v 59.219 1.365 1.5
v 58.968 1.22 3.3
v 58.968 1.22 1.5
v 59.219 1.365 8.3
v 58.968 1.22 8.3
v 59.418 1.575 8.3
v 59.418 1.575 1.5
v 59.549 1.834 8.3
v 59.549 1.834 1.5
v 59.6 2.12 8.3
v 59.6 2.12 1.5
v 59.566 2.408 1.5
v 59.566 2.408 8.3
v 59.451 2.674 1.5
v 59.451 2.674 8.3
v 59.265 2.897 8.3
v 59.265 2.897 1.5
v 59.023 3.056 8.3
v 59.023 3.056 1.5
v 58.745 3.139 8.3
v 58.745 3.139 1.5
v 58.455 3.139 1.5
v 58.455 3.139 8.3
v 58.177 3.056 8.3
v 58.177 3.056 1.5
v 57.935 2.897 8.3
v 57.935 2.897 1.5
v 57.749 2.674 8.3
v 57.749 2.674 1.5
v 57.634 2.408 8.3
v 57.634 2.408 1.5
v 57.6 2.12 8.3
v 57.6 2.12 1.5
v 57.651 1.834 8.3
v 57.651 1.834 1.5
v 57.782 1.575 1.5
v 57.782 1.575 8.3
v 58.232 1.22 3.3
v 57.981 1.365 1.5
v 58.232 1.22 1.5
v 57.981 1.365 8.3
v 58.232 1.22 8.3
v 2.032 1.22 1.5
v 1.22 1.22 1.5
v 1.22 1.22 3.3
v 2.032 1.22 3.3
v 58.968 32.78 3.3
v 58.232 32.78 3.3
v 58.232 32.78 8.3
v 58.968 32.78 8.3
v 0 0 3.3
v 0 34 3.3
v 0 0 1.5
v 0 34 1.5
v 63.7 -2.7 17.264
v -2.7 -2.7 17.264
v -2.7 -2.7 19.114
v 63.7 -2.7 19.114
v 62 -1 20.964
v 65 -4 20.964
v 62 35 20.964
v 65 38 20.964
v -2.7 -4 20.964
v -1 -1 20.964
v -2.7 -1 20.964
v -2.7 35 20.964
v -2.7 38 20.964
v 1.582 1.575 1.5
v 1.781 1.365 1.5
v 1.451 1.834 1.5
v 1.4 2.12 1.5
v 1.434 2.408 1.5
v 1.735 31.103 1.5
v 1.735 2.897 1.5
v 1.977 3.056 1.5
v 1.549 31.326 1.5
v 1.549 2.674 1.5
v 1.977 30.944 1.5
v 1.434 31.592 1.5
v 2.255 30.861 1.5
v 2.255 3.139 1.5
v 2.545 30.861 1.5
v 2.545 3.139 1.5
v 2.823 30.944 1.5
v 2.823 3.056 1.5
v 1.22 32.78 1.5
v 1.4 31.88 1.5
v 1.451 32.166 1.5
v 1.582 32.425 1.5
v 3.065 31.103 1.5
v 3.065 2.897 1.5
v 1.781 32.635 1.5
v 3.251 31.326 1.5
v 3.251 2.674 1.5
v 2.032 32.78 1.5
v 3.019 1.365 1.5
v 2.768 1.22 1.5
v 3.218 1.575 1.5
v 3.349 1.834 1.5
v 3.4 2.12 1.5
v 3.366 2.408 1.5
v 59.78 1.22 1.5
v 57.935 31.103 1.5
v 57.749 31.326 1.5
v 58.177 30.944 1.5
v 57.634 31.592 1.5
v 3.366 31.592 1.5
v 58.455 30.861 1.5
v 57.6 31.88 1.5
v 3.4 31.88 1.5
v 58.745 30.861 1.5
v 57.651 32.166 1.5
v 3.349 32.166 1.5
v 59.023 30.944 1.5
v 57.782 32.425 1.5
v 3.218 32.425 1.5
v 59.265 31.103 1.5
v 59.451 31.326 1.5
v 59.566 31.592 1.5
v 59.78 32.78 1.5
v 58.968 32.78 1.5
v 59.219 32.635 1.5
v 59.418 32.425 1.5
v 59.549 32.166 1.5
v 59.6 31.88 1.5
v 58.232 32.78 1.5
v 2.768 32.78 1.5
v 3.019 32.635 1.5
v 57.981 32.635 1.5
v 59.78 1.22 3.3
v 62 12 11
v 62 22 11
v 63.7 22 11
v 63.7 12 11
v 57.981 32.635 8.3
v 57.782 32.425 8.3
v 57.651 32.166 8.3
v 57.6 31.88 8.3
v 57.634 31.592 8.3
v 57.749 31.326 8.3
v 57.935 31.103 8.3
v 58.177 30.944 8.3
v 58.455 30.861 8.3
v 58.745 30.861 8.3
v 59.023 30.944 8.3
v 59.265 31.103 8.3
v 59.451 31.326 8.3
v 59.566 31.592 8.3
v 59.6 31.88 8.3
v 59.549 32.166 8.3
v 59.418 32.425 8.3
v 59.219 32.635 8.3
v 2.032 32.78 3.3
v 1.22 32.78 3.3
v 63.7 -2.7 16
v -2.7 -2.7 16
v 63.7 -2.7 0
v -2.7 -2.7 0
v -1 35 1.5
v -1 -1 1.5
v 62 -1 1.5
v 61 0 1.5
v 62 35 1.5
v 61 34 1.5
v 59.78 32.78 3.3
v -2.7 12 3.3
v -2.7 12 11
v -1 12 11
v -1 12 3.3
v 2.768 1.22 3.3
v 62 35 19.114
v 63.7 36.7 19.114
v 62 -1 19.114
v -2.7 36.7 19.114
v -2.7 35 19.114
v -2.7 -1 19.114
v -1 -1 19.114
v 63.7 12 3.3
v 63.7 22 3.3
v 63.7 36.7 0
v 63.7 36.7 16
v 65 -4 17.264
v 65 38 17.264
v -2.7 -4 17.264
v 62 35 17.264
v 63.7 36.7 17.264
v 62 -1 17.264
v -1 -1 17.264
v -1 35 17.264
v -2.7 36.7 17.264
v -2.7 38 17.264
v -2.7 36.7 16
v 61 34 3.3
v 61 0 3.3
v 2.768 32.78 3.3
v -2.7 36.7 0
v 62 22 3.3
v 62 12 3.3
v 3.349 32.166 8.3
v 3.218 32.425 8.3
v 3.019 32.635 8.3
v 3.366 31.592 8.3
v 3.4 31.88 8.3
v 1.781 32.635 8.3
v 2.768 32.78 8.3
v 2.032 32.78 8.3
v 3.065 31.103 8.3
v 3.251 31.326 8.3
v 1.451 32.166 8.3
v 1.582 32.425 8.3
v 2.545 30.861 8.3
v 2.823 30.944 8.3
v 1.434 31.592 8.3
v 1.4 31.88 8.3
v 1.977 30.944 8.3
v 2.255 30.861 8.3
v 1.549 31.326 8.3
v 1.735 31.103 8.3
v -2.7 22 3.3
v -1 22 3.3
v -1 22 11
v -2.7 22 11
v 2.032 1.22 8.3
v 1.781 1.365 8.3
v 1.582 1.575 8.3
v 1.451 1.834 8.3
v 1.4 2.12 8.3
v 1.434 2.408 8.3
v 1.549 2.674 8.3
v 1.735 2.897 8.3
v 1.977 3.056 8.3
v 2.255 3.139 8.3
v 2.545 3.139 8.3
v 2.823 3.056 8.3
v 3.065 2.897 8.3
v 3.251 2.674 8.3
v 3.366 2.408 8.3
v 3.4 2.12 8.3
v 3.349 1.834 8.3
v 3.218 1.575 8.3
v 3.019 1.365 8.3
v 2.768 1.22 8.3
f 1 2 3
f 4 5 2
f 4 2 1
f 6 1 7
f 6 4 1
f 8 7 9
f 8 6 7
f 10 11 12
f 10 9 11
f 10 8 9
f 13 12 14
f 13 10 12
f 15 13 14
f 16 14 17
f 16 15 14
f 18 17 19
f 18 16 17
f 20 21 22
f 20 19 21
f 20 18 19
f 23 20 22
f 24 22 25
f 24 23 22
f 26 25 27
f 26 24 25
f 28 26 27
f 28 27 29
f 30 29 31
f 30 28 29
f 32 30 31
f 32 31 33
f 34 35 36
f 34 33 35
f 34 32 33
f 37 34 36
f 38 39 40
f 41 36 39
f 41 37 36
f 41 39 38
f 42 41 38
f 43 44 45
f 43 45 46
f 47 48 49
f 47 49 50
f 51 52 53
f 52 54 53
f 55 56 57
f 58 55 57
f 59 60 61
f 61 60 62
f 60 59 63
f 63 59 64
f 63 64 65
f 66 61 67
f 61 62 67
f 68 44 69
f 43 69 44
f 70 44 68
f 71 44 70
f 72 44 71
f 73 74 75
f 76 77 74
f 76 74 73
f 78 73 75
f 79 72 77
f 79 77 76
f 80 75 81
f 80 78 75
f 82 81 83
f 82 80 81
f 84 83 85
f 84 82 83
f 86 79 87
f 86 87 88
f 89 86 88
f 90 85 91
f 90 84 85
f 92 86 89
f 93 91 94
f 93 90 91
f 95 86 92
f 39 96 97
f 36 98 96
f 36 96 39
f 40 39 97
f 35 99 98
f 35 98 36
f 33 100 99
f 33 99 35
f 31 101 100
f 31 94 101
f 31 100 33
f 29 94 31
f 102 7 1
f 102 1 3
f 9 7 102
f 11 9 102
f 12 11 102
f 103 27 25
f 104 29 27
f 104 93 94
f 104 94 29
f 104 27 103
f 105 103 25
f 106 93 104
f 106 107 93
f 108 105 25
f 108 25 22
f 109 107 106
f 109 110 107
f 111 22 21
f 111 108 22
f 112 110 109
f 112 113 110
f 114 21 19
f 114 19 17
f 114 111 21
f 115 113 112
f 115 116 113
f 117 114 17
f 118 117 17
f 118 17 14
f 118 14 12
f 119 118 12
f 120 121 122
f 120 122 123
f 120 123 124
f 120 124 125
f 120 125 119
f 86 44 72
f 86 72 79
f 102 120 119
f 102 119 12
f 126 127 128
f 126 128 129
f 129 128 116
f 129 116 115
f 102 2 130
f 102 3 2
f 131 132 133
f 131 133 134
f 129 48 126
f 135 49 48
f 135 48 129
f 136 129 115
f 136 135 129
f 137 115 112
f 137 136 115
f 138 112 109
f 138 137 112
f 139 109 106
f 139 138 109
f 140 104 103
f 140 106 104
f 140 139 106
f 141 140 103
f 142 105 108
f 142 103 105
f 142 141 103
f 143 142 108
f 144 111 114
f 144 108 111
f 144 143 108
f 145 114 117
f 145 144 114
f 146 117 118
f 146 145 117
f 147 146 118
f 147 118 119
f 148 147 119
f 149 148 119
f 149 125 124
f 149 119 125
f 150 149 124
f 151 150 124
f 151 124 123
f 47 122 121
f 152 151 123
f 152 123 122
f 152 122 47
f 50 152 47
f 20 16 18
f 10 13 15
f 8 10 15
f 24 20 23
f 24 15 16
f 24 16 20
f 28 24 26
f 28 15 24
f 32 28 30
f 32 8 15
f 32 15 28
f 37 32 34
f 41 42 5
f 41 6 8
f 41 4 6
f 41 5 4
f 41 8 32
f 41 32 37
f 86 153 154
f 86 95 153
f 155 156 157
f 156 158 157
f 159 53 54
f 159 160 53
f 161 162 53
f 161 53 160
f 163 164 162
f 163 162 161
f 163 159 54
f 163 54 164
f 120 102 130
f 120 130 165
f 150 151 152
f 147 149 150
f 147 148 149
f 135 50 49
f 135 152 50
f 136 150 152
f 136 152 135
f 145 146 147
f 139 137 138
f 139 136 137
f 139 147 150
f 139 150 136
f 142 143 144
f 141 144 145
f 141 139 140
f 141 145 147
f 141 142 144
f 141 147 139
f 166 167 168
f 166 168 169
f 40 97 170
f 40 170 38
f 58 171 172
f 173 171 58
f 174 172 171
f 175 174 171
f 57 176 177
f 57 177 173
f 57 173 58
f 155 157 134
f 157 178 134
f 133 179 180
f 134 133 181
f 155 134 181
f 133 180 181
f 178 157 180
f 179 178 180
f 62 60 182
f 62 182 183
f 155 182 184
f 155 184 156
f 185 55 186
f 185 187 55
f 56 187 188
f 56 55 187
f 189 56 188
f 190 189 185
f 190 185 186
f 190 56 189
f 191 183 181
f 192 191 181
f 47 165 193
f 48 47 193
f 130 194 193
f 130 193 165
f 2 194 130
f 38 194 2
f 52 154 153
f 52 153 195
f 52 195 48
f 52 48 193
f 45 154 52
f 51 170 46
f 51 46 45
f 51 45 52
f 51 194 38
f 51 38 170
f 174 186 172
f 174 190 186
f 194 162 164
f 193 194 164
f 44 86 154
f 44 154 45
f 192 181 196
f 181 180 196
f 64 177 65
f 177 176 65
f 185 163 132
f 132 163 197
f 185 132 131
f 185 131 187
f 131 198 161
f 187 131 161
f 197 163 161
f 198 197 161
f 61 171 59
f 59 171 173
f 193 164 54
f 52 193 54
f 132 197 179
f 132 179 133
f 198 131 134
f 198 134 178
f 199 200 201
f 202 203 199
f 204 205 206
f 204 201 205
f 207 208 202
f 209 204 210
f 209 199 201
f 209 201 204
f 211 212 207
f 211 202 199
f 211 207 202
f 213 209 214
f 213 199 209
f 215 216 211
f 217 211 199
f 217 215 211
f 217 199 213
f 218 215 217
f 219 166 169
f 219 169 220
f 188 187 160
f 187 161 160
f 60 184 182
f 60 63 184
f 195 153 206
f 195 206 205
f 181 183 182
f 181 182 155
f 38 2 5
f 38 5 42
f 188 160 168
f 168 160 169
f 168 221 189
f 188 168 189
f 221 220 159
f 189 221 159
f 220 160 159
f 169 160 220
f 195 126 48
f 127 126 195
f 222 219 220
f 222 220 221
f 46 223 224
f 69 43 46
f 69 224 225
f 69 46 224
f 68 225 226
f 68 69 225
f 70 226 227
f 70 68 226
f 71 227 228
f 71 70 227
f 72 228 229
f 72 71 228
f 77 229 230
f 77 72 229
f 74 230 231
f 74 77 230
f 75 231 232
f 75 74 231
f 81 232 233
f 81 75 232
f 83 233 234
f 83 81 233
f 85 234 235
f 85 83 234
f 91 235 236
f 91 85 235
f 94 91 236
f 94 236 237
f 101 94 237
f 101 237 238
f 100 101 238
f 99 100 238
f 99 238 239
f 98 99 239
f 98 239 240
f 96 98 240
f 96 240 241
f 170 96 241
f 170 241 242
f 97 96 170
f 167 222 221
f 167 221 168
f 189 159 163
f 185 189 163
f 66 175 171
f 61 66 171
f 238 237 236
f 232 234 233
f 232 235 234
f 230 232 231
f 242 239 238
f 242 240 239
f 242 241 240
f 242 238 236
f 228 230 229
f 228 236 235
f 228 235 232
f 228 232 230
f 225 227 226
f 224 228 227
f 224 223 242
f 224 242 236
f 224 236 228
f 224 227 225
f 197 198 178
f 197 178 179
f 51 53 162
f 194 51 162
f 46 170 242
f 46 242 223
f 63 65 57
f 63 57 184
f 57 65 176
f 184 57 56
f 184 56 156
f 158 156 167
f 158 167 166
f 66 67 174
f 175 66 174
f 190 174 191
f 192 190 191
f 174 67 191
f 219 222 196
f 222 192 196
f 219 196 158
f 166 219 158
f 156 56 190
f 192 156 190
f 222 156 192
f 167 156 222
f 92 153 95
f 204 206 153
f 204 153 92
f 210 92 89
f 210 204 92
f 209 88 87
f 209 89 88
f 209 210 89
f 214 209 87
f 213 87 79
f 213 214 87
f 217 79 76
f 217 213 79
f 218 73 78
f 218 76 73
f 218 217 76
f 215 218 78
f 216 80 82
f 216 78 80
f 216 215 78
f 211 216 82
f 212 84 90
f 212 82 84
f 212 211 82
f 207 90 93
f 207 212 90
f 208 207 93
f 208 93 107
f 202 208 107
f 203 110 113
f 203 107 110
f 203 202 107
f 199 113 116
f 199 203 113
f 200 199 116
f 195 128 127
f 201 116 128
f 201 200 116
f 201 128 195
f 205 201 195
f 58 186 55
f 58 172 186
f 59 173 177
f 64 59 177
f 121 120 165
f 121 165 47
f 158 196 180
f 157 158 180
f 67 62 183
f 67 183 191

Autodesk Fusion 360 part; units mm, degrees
sketch "Spodek" plane through (0, 0, 0) normal (0, 0, 1) x (1, 0, 0)
  line L0 (0, 0) -> (61, 0)
  line L1 (61, 0) -> (61, 34)
  line L2 (61, 34) -> (0, 34)
  line L3 (0, 34) -> (0, 0)
  line L4 (-1, 35) -> (62, 35)
  line L5 (62, 35) -> (62, -1)
  line L6 (62, -1) -> (-1, -1)
  line L7 (-1, -1) -> (-1, 35)
  line L8 (-2.7, -2.7) -> (-2.7, 36.7) construction
  line L9 (63.7, 36.7) -> (-2.7, 36.7) construction
  line L10 (63.7, -2.7) -> (63.7, 36.7) construction
  line L11 (63.7, -2.7) -> (-2.7, -2.7) construction
  line L12 (-2.7, -2.7) -> (63.7, -2.7)
  line L13 (63.7, -2.7) -> (63.7, 36.7)
  line L14 (63.7, 36.7) -> (-2.7, 36.7)
  line L15 (-2.7, 36.7) -> (-2.7, -2.7)
  dimension "d1" = 61
  dimension "d2" = 34
  dimension "d3" = 63
  dimension "d4" = 36
  dimension "d5" = 1.7
  dimension "d6" = 1.7
  dimension "d7" = 1.7
  dimension "d8" = 1.7
sketch "TotoNevim" plane through (0, 0, 0) normal (0, 0, 1) x (1, 0, 0)
extrude "Extrude1" add sketch "Spodek" along normal blind 12 contours L12 L13 L14 L15 makes body 1
extrude "Extrude2" add sketch "Spodek" along normal blind 1.5 contours L0 L1 L2 L3 | L4 L5 L6 L7 bodies 1
sketch "Sketch3" plane through (0, 0, 1.5) normal (0, 0, 1) x (-1, 0, 0)
  line L0 (1, 1) -> (-62, 1)
  line L1 (-62, 1) -> (-62, -35)
  line L2 (-62, -35) -> (1, -35)
  line L3 (1, -35) -> (1, 1)
  line L4 (-59.78, -32.78) -> (-1.22, -32.78)
  line L5 (-1.22, -32.78) -> (-1.22, -1.22)
  line L6 (-1.22, -1.22) -> (-59.78, -1.22)
  line L7 (-59.78, -1.22) -> (-59.78, -32.78)
  line L8 (-61, 0) -> (-61, -34)
  line L9 (0, 0) -> (-61, 0)
  line L10 (0, -34) -> (0, 0)
  line L11 (-61, -34) -> (0, -34)
  dimension "d13" = 1.22
  dimension "d14" = 1.22
  dimension "d15" = 1.22
  dimension "d16" = 1.22
extrude "Extrude3" add sketch "Sketch3" along normal blind 1.8 contours L8 L9 L10 L11 bodies 1
extrude "Extrude4" add 1 faces at (20, -2.1333, 12) along direction (0, 0, 1) blind 5.243 on bodies 1 bodies 1
extrude "Extrude5" add 1 faces at (20, -2.1333, 17.243) along direction (0, 0, 1) blind 0.021 on bodies 1 bodies 1
sketch "Prurez1" plane through (-2.7, 0, 0) normal (-1, 0, 0) x (0, -1, 0)
  line L0 (-36.7, 0) -> (2.7, 0)
  line L1 (2.7, 0) -> (2.7, 17.264)
  line L2 (2.7, 17.264) -> (-36.7, 17.264)
  line L3 (-36.7, 17.264) -> (-36.7, 0)
  line L4 (-12, 3.3) -> (-12, 11) construction
  line L5 (0, 1.5) -> (0, 3.3) construction
  line L6 (-22, 11) -> (-22, 3.3) construction
  line L7 (-34, 3.3) -> (-34, 11) construction
  line L8 (-35, 1.5) -> (-35, 17.264) construction
  line L9 (-22, 11) -> (-12, 11) construction
  line L10 (-12, 11) -> (-12, 3.3) construction
  line L11 (-12, 3.3) -> (-22, 3.3) construction
  line L12 (-22, 3.3) -> (-22, 11) construction
  line L13 (-22, 11) -> (-12, 11)
  line L14 (-12, 11) -> (-12, 3.3)
  line L15 (-12, 3.3) -> (-22, 3.3)
  line L16 (-22, 3.3) -> (-22, 11)
  dimension "d23" = 7.7
  dimension "d24" = 12
  dimension "d25" = 12
  dimension "d26" = 1
extrude "Extrude6" cut sketch "Prurez1" against normal up to surface (66.4 mm away) contours L13 L14 L15 L16 bodies 1
sketch "Sketch5" plane through (0, 0, 17.264) normal (0, 0, 1) x (-1, 0, 0)
  line L0 (-62, 1) -> (1, 1)
  line L1 (1, 1) -> (1, -35)
  line L2 (1, -35) -> (-62, -35)
  line L3 (-62, -35) -> (-62, 1)
  line L4 (2.7, -36.7) -> (2.7, 2.7)
  line L5 (2.7, 2.7) -> (-63.7, 2.7)
  line L6 (-63.7, 2.7) -> (-63.7, -36.7)
  line L7 (-63.7, -36.7) -> (2.7, -36.7)
  line L8 (2.7, -36.7) -> (-63.7, -36.7)
  line L9 (-63.7, -36.7) -> (-63.7, 2.7)
  line L10 (-63.7, 2.7) -> (2.7, 2.7)
  line L11 (2.7, 2.7) -> (2.7, -36.7)
  line L12 (1, -35) -> (-62, -35)
  line L13 (-62, -35) -> (-62, 1)
  line L14 (-62, 1) -> (1, 1)
  line L15 (1, 1) -> (1, -35)
extrude "Extrude7" add sketch "Sketch5" along normal blind 3.7 bodies 1
sketch "Sketch6" plane through (-2.7, 0, 0) normal (-1, 0, 0) x (0, -1, 0)
  line L0 (-22, 3.3) -> (-22, 11)
  line L1 (-22, 11) -> (-12, 11)
  line L2 (-12, 11) -> (-12, 3.3)
  line L3 (-12, 3.3) -> (-22, 3.3)
  line L4 (-36.7, 0) -> (2.7, 0)
  line L5 (2.7, 0) -> (2.7, 20.964)
  line L6 (2.7, 20.964) -> (-36.7, 20.964)
  line L7 (-36.7, 20.964) -> (-36.7, 0)
  line L8 (-35, 17.264) -> (1.0001, 17.264)
  line L9 (1.0001, 17.264) -> (1.0001, 20.964)
  line L10 (1.0001, 20.964) -> (-35, 20.964)
  line L11 (-35, 20.964) -> (-35, 17.264)
  line L12 (-36.7, 17.264) -> (2.7, 17.264)
extrude "Extrude8" cut sketch "Sketch6" against normal up to surface (64.7 mm away) contours L6 L8 L9 L10 L11 L12 bodies 1
sketch "BokFront" plane through (0, -2.7, 0) normal (0, -1, 0) x (1, 0, 0)
  line L0 (-2.7, 0) -> (63.7, 0)
  line L1 (63.7, 0) -> (63.7, 20.964)
  line L2 (63.7, 20.964) -> (-2.7, 20.964)
  line L3 (-2.7, 20.964) -> (-2.7, 0)
  line L4 (-2.7, 20.964) -> (63.7, 20.964)
  line L5 (63.7, 20.964) -> (63.7, 17.264)
  line L6 (63.7, 17.264) -> (-2.7, 17.264)
  line L7 (-2.7, 17.264) -> (-2.7, 20.964)
  point P0 (63.7, 17.264)
sketch "BokRight" plane through (63.7, 0, 0) normal (1, 0, 0) x (0, 1, 0)
  line L0 (22, 11) -> (22, 3.3)
  line L1 (22, 3.3) -> (12, 3.3)
  line L2 (12, 3.3) -> (12, 11)
  line L3 (12, 11) -> (22, 11)
  line L4 (-2.7, 0) -> (36.7, 0)
  line L5 (36.7, 0) -> (36.7, 20.964)
  line L6 (36.7, 20.964) -> (-2.7, 20.964)
  line L7 (-2.7, 20.964) -> (-2.7, 0)
  line L8 (-2.7, 20.964) -> (36.7, 20.964)
  line L9 (36.7, 20.964) -> (36.7, 17.264)
  line L10 (36.7, 17.264) -> (-2.7, 17.264)
  line L11 (-2.7, 17.264) -> (-2.7, 20.964)
  point P0 (36.7, 17.264)
sketch "BokBack" plane through (0, 36.7, 0) normal (0, 1, 0) x (-1, 0, 0)
  line L0 (-63.7, 0) -> (2.7, 0)
  line L1 (2.7, 0) -> (2.7, 20.964)
  line L2 (2.7, 20.964) -> (-63.7, 20.964)
  line L3 (-63.7, 20.964) -> (-63.7, 0)
  line L4 (-63.7, 20.964) -> (2.7, 20.964)
  line L5 (2.7, 20.964) -> (2.7, 17.264)
  line L6 (2.7, 17.264) -> (-63.7, 17.264)
  line L7 (-63.7, 17.264) -> (-63.7, 20.964)
  point P0 (2.7, 17.264)
extrude "Extrude9" add sketch "BokBack" along normal blind 1.3 contours L1 L2 L3 L4 L5 L6 L7 bodies 1
extrude "Extrude10" add sketch "BokFront" along normal blind 1.3 contours L1 L2 L3 L4 L5 L6 L7 bodies 1
extrude "Extrude11" add sketch "BokRight" along normal blind 1.3 contours L5 L6 L7 L8 L9 L10 L11 bodies 1
extrude "Extrude12" add 1 faces at (63.7, 37.5667, 19.7307) along direction (1, 0, 0) blind 1.3 on bodies 1 bodies 1
extrude "Extrude13" add 1 faces at (63.7, -3.1333, 19.7307) along direction (1, 0, 0) blind 1.3 on bodies 1 bodies 1
sketch "Sketch10" plane through (-2.7, 0, 0) normal (-1, 0, 0) x (0, -1, 0)
  line L0 (-35, 17.264) -> (-35, 20.964)
  line L1 (-35, 20.964) -> (-38, 20.964)
  line L2 (-38, 20.964) -> (-38, 17.264)
  line L3 (-38, 17.264) -> (-36.7, 17.264)
  line L4 (-36.7, 17.264) -> (-36.7, 0)
  line L5 (-36.7, 0) -> (2.7, 0)
  line L6 (2.7, 0) -> (2.7, 17.264)
  line L7 (2.7, 17.264) -> (4, 17.264)
  line L8 (4, 17.264) -> (4, 20.964)
  line L9 (4, 20.964) -> (1.0001, 20.964)
  line L10 (1.0001, 20.964) -> (1.0001, 17.264)
  line L11 (1.0001, 17.264) -> (-35, 17.264)
  line L12 (-22, 3.3) -> (-22, 11)
  line L13 (-22, 11) -> (-12, 11)
  line L14 (-12, 11) -> (-12, 3.3)
  line L15 (-12, 3.3) -> (-22, 3.3)
  line L16 (4, 17.264) -> (2.7, 16)
  line L17 (-38, 17.264) -> (-36.7, 16)
extrude "Extrude14" add sketch "Sketch10" against normal up to surface (67.7 mm away) contours L3 L4 L17 | L6 L7 L16 bodies 1
sketch "Sketch11" plane through (0, -2.7, 0) normal (0, 1, 0) x (-1, 0, 0)
  line L0 (-63.7, 16) -> (-63.7, 17.264)
  line L1 (-63.7, 17.264) -> (-65, 17.264)
  line L2 (-65, 17.264) -> (-65, 16)
  line L3 (-65, 16) -> (-63.7, 16)
  line L4 (-65, 17.264) -> (-63.7, 16)
extrude "Extrude15" add sketch "Sketch11" along normal blind 39.4 contours L0 L1 L4 bodies 1
extrude "Extrude16" cut 1 faces at (64.5667, -2.7, 16.4213) along direction (0, -1, 0) blind 5.3 on bodies 1 bodies 1
extrude "Extrude17" cut 1 faces at (64.5667, 36.7, 16.4213) along direction (0, 1, 0) blind 1.9 on bodies 1 bodies 1
sketch "Sketch12" plane through (-2.7, 35.85, 19.114) normal (-1, 0, 0) x (0, -1, 0)
  line L0 (-0.85, 0) -> (0.85, 0)
  line L1 (0.85, 0) -> (0.85, -1.85)
  line L2 (0.85, -1.85) -> (-0.85, -1.85)
  line L3 (-0.85, -1.85) -> (-0.85, 0)
  line L4 (-0.85, 1.85) -> (-0.85, -19.114)
  line L5 (36.8501, -1.85) -> (38.55, -1.85)
  line L6 (38.55, -1.85) -> (38.55, 0)
  line L7 (38.55, 0) -> (36.8501, 0)
  line L8 (36.8501, 0) -> (36.8501, -1.85)
  line L9 (38.55, -19.114) -> (38.55, 1.85)
  point P0 (0.85, -1.85)
  point P1 (36.8501, -1.85)
extrude "Extrude18" cut sketch "Sketch12" against normal blind 64.7 bodies 1
sketch "Sketch13" plane through (62, 0, 0) normal (-1, 0, 0) x (0, -1, 0)
  line L0 (-35, 17.264) -> (-35, 1.5)
  line L1 (-35, 1.5) -> (1, 1.5)
  line L2 (1, 1.5) -> (1, 17.264)
  line L3 (1.0001, 17.264) -> (2.7, 17.264)
  line L4 (2.7, 17.264) -> (2.7, 19.114)
  line L5 (2.7, 19.114) -> (1.0001, 19.114)
  line L6 (1, 19.114) -> (1, 20.964)
  line L7 (1, 20.964) -> (-35, 20.964)
  line L8 (-35, 20.964) -> (-35, 19.114)
  line L9 (-35, 19.114) -> (-36.7, 19.114)
  line L10 (-36.7, 19.114) -> (-36.7, 17.264)
  line L11 (-36.7, 17.264) -> (-35, 17.264)
  line L12 (-22, 3.3) -> (-22, 11)
  line L13 (-22, 11) -> (-12, 11)
  line L14 (-12, 11) -> (-12, 3.3)
  line L15 (-12, 3.3) -> (-22, 3.3)
  line L16 (-36.7, 19.114) -> (2.7, 19.114)
  line L17 (2.7, 19.114) -> (2.7, 17.264)
  line L18 (2.7, 17.264) -> (-36.7, 17.264)
  line L19 (-36.7, 17.264) -> (-36.7, 19.114)
extrude "Extrude19" cut sketch "Sketch13" against normal blind 1.7 contours L3 L4 L5 L9 L10 L11 L16 L17 L18 L19 bodies 1
sketch "Sketch14" plane through (0, 0, 3.3) normal (0, 0, 1) x (-1, 0, 0)
  line L0 (0, -34) -> (0, 0)
  line L1 (0, 0) -> (-61, 0)
  line L2 (-61, 0) -> (-61, -34)
  line L3 (-61, -34) -> (0, -34)
  line L4 (-1.22, -1.22) -> (-1.22, -32.78)
  line L5 (-1.22, -32.78) -> (-59.78, -32.78)
  line L6 (-59.78, -32.78) -> (-59.78, -1.22)
  line L7 (-59.78, -1.22) -> (-1.22, -1.22)
  circle A0 centre (-58.6, -31.85) radius 1
  line L8 (-61, -17) -> (0, -17) construction
  circle A1 centre (-58.6, -2.15) radius 1
  line L9 (-30.5, -34) -> (-30.5, 0) construction
  circle A2 centre (-2.4, -31.85) radius 1
  circle A3 centre (-2.4, -2.15) radius 1
  point P0 (-58.6, -31.85)
  dimension "d55" = 2.15
  dimension "d56" = 2.4
  dimension "d57" = 2
extrude "Extrude20" add sketch "Sketch14" along normal blind 5 separate body contours L7 A3 | L5 A2 | L7 A1 | L5 A0 picked at (-2.6077, -1.9583) picked at (-2.278, -32.1598) picked at (-58.2997, -2.1959) picked at (-58.3551, -31.7867) makes body 2 at (59.2633, 32.5983, 6.6333) makes body 3 at (59.1416, 2.9907, 6.6333) makes body 4 at (3.0633, 32.5983, 6.6333) makes body 5 at (2.8103, 3.062, 6.6333)
extrude "Extrude21" add 4 faces at (2.6077, 1.9583, 3.3) (2.278, 32.1598, 3.3) (58.3551, 31.7867, 3.3) (58.2997, 2.1959, 3.3) along direction (0, 0, -1) blind 2 on bodies 2 3 4 5 bodies 5 1 2 3 4
equation "d19 = 14 mm - 8.757 mm"
equation "d21 = 14 mm - 13.979 mm"
equation "d33 = 3 mm - 1.70 mm"
equation "d35 = 3 mm - 1.70 mm"
equation "d37 = 3 mm - 1.70 mm"
